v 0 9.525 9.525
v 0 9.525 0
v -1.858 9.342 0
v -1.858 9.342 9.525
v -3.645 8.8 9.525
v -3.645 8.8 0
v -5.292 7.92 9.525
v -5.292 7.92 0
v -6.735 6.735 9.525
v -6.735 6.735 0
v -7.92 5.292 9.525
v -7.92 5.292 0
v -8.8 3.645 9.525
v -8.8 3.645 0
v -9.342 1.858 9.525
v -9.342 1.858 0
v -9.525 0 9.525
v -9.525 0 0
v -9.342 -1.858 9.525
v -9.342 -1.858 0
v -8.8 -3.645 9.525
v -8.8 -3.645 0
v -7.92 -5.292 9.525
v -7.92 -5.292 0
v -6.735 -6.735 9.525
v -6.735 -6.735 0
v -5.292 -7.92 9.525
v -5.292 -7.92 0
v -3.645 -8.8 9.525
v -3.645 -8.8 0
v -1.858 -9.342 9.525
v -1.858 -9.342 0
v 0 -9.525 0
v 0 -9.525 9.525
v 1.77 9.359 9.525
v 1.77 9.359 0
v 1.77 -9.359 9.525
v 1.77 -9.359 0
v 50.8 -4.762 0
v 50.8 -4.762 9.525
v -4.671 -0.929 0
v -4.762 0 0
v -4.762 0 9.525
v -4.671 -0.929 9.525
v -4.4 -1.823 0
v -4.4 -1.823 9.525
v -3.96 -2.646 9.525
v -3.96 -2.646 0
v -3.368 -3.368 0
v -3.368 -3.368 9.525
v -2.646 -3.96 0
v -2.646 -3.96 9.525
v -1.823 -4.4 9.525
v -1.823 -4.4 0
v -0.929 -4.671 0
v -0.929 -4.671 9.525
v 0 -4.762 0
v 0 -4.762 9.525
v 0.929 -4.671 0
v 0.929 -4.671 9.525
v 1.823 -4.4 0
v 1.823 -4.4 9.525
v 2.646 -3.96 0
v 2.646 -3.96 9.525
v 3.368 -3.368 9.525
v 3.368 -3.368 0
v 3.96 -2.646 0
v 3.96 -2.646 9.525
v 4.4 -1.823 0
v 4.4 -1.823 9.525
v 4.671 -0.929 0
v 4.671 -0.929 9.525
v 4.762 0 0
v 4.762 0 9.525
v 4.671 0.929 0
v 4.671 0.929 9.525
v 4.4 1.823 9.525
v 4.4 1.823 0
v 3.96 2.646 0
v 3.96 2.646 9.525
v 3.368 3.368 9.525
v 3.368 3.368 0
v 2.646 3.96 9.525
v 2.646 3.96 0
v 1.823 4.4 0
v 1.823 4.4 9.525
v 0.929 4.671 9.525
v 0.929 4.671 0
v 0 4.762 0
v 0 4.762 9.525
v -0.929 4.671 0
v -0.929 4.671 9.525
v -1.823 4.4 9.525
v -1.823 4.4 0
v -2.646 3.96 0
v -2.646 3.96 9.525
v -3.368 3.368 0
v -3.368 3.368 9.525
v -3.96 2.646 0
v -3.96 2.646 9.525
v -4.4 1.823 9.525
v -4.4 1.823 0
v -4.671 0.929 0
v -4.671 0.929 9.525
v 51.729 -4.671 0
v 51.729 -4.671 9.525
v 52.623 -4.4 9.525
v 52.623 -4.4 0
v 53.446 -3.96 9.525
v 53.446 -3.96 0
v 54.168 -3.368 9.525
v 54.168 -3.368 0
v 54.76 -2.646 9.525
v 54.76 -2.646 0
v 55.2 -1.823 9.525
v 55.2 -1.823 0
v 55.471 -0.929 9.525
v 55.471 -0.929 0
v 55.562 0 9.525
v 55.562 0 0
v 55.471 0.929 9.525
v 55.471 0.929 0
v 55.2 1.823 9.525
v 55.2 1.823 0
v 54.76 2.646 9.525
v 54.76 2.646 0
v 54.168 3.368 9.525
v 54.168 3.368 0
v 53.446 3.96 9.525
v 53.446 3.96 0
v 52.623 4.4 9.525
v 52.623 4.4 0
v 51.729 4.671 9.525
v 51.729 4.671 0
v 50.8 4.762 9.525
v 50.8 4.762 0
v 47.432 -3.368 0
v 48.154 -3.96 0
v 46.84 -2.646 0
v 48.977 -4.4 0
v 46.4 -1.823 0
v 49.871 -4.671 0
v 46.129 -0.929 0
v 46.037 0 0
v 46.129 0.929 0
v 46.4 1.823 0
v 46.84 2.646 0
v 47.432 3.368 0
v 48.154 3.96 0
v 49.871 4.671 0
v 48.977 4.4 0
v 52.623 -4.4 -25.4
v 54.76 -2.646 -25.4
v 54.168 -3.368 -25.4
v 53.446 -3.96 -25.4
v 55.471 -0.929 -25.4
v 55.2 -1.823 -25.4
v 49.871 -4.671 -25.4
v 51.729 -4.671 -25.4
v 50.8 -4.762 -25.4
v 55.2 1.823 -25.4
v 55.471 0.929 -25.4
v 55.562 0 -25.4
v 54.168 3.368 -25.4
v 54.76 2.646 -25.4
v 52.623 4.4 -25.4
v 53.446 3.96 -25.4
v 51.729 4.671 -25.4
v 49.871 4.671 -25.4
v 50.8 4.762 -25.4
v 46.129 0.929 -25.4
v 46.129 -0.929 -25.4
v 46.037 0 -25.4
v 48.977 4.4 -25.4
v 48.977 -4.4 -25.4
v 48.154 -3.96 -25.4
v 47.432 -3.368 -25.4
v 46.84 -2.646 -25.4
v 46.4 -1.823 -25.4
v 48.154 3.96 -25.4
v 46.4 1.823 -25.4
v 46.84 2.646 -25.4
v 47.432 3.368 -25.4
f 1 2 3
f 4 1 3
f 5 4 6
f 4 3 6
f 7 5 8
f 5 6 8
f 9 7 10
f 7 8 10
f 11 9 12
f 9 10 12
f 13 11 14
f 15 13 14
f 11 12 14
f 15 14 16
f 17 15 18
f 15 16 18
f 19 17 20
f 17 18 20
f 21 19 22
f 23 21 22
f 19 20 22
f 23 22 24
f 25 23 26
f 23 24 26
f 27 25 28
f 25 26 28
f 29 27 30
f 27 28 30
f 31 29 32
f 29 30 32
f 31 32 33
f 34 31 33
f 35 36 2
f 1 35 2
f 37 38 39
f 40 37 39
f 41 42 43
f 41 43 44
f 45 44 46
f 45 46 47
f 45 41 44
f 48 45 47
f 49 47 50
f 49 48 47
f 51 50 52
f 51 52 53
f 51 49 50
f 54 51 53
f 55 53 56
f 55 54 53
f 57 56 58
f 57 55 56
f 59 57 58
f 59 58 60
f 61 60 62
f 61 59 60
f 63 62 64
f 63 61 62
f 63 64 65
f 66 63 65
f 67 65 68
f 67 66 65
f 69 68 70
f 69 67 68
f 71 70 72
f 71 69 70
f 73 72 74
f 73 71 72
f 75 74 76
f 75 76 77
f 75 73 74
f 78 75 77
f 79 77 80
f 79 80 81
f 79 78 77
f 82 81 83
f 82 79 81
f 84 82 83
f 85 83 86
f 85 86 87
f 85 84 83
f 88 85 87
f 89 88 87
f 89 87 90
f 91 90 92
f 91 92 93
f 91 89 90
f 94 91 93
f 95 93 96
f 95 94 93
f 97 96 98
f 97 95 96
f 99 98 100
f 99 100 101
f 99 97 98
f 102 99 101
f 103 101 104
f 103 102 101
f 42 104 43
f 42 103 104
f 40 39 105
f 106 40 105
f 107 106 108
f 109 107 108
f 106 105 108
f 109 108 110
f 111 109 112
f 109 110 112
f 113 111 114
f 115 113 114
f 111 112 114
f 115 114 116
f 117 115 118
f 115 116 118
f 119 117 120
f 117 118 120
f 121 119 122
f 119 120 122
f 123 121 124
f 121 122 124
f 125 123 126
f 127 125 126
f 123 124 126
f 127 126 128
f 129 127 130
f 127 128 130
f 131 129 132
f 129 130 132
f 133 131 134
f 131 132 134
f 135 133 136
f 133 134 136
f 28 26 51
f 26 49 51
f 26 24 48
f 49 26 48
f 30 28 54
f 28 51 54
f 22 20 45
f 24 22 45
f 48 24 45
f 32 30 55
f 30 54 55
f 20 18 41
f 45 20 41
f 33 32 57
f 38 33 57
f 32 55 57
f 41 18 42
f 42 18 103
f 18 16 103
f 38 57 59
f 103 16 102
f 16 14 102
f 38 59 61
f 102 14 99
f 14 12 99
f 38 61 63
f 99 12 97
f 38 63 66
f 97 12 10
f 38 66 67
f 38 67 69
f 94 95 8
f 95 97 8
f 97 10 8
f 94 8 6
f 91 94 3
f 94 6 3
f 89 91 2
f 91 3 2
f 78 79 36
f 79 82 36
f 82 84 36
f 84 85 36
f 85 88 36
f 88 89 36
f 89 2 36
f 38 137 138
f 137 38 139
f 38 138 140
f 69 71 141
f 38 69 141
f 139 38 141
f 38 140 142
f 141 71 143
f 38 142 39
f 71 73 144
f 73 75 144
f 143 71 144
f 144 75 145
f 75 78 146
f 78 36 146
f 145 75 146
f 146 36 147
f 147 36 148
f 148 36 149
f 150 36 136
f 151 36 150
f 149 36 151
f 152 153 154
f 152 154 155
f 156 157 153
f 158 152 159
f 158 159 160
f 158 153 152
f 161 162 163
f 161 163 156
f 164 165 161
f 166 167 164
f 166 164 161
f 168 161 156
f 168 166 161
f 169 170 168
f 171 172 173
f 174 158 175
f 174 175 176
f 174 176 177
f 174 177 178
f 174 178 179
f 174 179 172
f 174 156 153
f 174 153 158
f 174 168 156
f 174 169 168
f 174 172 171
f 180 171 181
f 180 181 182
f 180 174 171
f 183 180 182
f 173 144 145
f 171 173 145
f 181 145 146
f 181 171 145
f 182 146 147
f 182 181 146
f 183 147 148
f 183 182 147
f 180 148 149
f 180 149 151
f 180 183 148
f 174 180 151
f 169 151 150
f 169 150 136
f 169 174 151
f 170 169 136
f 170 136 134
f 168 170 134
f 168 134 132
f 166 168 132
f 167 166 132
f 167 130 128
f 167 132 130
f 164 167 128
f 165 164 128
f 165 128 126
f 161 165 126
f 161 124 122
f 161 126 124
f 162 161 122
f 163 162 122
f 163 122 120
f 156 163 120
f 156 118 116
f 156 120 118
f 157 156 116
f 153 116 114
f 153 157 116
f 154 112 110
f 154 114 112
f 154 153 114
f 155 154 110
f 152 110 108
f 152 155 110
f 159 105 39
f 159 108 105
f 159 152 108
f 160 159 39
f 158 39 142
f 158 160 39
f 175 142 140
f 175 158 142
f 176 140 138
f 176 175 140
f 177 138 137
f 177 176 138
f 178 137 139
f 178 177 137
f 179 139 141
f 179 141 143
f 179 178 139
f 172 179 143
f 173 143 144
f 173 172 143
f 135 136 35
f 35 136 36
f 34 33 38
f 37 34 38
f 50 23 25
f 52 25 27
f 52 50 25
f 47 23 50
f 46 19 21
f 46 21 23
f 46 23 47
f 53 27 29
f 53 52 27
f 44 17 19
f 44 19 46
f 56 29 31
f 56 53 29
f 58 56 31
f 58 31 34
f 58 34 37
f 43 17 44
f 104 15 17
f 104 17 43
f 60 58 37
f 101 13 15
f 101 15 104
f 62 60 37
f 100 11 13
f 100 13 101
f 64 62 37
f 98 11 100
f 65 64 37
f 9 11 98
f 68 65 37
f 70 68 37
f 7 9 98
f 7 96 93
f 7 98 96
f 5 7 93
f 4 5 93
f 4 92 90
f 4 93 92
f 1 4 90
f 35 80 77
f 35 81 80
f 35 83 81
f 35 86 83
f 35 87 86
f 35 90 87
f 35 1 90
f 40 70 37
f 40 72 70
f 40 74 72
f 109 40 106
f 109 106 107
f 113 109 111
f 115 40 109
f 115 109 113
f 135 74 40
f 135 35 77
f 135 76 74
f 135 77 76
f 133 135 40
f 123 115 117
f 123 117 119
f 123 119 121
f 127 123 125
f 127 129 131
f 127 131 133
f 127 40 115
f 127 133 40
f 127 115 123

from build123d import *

# Parameters (mm, degrees)
SKETCH1_R           = 4.7625
BOSS_EXTRUDE1_DEPTH = 9.525
BOSS_EXTRUDE4_START = 25.4
SKETCH4_R           = 4.7625
BOSS_EXTRUDE4_DEPTH = 25.4


with BuildPart() as part:
    # Sketch1 → Boss-Extrude1 (new body)
    with BuildSketch(Plane.XY):
        with BuildLine():
            ThreePointArc((0, 9.525), (-9.525, 0), (0, -9.525))
            Line((0, -9.525), (1.770377541, -9.359027106))
            Line((1.770377541, -9.359027106), (50.8, -4.7625))
            ThreePointArc((50.8, -4.7625), (55.5625, 0), (50.8, 4.7625))
            Line((50.8, 4.7625), (1.770377541, 9.359027106))
            Line((1.770377541, 9.359027106), (0, 9.525))
        make_face()
        with Locations(Location((0, 0, 0), (0, 0, 180))):
            Circle(SKETCH1_R, mode=Mode.SUBTRACT)
    extrude(amount=BOSS_EXTRUDE1_DEPTH)

    # Sketch4 → Boss-Extrude4 (add)
    with BuildSketch(Plane(origin=(0, 0, 0), x_dir=(-1, 0, 0), z_dir=(0, 0, -1)).offset(BOSS_EXTRUDE4_START)):
        with Locations((-50.8, 0)):
            Circle(SKETCH4_R)
    extrude(amount=-BOSS_EXTRUDE4_DEPTH)


solid = part.part
